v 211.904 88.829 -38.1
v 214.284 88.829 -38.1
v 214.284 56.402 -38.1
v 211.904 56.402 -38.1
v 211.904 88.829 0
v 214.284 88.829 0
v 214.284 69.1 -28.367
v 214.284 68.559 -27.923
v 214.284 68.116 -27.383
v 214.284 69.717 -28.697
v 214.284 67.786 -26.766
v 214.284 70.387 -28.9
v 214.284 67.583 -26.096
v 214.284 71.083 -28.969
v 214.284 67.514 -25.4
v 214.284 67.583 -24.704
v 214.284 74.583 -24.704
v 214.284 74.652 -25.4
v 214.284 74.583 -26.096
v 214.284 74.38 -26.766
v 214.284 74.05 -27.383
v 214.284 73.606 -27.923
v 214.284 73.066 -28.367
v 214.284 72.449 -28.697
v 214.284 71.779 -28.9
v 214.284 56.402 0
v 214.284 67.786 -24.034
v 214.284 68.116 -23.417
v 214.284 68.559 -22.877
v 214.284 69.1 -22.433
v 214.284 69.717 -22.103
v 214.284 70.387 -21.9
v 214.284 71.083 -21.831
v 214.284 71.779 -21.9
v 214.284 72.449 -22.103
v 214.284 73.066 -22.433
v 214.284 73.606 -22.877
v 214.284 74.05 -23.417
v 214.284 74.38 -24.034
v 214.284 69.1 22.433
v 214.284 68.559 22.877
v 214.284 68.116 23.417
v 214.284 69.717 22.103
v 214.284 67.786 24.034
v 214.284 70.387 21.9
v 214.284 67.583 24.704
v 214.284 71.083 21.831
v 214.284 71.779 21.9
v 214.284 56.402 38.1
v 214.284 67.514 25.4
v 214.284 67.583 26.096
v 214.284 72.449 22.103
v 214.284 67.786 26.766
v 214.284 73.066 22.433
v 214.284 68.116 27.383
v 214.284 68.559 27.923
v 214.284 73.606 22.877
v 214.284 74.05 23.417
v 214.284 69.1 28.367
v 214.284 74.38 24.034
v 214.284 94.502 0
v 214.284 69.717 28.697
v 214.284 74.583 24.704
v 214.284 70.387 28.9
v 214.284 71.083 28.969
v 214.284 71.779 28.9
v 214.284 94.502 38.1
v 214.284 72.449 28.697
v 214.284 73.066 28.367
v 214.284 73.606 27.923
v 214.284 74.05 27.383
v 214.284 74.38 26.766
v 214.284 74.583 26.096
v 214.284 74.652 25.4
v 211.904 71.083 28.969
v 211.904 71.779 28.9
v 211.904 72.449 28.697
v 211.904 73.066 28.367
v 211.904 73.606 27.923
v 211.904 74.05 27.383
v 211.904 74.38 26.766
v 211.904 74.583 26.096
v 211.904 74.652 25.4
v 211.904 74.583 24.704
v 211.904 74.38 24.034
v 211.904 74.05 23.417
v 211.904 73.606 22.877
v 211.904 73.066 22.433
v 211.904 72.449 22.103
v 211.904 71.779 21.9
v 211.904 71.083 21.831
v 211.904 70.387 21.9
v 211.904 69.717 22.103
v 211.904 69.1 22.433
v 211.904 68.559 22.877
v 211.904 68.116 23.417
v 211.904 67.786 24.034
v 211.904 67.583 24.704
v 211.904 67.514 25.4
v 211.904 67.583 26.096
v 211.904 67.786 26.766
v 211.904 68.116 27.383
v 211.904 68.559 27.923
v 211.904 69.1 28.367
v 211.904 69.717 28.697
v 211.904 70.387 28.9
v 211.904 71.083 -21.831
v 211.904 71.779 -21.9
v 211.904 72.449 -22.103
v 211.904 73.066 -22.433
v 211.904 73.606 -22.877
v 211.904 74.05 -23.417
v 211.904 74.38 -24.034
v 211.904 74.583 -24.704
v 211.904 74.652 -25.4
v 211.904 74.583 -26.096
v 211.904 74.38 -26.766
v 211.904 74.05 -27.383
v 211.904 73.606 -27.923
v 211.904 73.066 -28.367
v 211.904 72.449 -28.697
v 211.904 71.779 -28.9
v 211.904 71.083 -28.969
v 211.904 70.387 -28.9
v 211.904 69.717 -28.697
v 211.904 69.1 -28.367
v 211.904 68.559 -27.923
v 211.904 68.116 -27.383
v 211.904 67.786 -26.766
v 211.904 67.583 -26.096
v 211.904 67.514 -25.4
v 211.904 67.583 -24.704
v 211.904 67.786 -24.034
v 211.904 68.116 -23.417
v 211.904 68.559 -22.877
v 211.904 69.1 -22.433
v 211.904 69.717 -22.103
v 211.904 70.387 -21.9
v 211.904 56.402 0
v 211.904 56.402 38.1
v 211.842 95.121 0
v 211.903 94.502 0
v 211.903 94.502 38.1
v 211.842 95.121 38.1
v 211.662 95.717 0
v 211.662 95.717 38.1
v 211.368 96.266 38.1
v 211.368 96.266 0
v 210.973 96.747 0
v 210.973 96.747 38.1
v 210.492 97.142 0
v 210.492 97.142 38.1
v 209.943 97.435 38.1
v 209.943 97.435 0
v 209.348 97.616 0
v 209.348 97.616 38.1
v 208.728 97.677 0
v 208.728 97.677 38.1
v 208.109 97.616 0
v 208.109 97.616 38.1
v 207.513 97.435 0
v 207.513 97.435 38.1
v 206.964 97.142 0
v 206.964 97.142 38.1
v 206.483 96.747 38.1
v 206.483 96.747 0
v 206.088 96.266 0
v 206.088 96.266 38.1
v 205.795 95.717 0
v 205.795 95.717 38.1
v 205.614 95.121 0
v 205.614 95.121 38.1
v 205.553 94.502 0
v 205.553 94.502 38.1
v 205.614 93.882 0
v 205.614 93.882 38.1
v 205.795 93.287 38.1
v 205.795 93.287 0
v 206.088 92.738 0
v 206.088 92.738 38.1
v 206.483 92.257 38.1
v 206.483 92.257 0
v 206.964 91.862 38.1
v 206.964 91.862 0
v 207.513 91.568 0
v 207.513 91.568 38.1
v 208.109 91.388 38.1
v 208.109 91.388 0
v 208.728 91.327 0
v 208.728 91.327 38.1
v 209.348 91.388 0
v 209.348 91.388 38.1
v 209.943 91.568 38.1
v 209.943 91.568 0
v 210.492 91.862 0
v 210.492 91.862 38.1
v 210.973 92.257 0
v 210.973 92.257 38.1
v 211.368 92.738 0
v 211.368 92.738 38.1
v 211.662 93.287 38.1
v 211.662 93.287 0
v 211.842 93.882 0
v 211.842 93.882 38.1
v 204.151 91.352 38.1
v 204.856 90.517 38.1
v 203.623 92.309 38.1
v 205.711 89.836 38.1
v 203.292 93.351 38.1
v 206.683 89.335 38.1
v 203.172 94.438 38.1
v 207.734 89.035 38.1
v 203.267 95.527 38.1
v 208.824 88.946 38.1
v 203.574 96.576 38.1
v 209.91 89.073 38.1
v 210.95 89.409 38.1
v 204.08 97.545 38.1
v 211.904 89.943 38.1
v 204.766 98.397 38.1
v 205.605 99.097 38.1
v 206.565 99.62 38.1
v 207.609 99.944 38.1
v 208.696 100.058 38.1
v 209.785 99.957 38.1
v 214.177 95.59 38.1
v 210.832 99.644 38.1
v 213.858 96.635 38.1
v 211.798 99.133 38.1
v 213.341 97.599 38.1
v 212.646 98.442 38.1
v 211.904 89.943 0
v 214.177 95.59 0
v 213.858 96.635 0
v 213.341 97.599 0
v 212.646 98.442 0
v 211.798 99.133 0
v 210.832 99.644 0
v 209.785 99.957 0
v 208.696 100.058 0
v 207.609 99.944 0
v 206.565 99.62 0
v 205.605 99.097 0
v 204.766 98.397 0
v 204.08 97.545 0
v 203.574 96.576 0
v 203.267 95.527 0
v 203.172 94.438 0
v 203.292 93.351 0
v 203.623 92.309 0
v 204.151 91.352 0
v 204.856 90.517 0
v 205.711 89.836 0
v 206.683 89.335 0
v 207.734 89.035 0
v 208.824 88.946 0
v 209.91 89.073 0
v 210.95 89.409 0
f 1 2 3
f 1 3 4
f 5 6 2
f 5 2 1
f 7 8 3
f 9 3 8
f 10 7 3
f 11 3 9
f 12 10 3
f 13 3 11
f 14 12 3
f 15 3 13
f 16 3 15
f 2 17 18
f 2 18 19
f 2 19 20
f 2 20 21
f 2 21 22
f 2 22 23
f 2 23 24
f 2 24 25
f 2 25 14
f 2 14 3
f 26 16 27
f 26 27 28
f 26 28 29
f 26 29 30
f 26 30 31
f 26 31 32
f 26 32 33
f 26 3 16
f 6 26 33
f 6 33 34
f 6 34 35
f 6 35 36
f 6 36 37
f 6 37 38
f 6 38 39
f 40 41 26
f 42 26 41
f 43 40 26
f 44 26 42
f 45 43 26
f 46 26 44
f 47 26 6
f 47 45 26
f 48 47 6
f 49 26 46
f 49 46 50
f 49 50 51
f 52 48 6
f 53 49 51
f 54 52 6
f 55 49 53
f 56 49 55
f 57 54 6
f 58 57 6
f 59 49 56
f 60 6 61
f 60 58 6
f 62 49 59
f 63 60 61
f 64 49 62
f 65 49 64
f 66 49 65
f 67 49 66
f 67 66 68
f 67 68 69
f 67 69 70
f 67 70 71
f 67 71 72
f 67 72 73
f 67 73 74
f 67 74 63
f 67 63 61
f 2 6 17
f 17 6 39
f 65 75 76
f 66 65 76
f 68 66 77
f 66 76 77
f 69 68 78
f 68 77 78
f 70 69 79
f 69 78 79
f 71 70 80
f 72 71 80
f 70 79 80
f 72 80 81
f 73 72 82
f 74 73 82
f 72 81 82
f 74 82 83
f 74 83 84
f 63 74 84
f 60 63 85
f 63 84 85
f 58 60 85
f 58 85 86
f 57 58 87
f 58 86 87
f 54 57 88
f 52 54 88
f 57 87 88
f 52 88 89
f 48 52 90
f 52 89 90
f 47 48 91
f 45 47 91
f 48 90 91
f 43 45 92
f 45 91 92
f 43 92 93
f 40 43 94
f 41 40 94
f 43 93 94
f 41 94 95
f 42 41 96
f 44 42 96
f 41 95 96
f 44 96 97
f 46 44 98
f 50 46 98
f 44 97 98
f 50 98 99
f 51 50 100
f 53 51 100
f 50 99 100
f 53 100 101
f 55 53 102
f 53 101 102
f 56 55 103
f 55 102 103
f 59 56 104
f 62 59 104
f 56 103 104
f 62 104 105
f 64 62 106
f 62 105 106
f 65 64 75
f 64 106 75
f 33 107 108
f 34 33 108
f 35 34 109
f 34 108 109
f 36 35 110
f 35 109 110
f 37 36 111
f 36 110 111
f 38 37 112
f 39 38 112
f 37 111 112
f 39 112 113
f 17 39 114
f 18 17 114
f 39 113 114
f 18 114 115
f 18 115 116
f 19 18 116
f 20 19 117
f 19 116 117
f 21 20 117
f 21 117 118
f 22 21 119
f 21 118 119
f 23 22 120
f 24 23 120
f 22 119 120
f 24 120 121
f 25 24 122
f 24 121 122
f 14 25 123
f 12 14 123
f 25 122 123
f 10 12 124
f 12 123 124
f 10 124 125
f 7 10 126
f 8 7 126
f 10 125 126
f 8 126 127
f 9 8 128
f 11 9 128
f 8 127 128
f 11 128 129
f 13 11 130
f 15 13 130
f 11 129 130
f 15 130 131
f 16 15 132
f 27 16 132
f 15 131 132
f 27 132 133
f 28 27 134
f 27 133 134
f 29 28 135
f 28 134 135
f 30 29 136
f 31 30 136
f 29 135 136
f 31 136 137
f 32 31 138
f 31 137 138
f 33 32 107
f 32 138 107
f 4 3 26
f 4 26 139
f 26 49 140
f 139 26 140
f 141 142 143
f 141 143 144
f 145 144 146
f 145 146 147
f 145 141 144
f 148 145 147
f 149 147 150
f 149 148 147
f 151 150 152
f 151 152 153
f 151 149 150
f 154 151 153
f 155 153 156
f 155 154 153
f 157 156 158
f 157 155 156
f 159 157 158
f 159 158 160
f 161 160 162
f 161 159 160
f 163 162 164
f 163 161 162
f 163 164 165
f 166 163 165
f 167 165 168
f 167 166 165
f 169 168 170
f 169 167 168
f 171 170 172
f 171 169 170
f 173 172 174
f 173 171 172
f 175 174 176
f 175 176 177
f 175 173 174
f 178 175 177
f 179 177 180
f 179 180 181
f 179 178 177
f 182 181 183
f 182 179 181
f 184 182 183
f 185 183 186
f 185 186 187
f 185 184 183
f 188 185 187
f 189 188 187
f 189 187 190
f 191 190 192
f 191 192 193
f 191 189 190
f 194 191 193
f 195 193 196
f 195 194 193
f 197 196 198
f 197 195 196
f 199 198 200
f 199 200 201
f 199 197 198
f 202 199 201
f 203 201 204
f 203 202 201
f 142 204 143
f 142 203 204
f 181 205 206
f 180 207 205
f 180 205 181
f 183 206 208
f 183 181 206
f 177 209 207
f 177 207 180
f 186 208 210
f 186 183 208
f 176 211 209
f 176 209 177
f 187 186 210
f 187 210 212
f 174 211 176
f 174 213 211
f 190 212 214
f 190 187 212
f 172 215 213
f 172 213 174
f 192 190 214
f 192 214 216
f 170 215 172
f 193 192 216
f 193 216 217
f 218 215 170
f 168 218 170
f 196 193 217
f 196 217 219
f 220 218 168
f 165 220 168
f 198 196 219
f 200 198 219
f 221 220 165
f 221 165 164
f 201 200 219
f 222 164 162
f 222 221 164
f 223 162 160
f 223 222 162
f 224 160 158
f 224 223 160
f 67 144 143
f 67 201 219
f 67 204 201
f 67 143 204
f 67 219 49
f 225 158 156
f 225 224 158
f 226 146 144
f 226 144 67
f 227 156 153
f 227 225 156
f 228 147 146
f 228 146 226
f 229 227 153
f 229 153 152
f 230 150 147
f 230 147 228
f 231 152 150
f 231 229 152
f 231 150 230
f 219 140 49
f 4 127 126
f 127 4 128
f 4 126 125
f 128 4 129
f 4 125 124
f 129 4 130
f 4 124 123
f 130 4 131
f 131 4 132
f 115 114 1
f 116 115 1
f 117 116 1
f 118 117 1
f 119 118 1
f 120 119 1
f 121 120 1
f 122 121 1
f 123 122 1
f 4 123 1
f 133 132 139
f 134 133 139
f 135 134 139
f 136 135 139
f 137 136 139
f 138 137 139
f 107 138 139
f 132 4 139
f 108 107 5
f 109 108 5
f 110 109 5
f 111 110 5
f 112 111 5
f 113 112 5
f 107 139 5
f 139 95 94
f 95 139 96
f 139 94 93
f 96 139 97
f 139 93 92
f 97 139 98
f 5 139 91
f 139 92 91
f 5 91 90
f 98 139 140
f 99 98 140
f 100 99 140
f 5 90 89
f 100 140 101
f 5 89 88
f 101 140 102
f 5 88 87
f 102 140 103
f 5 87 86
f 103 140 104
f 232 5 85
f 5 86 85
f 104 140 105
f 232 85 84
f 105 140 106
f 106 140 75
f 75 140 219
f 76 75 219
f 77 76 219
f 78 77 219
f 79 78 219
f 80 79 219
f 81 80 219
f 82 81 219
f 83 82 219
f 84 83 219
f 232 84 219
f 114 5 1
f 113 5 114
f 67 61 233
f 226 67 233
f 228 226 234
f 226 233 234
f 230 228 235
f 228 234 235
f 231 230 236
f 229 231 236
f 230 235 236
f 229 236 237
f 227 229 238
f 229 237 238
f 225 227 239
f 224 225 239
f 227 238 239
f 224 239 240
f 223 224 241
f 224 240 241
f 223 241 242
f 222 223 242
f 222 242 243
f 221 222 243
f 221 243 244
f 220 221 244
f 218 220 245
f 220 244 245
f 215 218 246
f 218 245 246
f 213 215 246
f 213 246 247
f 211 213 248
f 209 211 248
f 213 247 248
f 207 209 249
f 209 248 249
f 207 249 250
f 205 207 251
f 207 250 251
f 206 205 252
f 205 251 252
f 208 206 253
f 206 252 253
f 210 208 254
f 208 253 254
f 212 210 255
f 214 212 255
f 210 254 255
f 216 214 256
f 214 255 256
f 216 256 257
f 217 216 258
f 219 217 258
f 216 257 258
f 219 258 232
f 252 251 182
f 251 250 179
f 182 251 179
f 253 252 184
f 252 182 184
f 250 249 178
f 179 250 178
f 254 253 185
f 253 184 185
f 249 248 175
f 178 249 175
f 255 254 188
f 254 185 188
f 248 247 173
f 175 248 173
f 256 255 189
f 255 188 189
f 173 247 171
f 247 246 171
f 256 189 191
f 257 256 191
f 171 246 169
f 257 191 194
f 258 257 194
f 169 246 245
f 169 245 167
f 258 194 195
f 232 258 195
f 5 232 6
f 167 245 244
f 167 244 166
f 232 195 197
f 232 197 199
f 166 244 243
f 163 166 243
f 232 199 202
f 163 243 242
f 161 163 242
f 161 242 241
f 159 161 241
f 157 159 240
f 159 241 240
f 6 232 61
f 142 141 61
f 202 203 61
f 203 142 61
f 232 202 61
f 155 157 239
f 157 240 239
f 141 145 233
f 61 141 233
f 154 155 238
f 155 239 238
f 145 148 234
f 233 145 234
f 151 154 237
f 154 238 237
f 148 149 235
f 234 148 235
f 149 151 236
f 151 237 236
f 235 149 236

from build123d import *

# Parameters (mm, degrees)
SKETCH1_R          = 3.175
EXTRUDE1_DEPTH     = 38.1
SKETCH2_W          = 2.380423229
SKETCH2_H          = 32.427702335
EXTRUDE2_DEPTH     = 38.1
SKETCH3_R          = 3.5687
CUT_EXTRUDE1_DEPTH = 2.380423


with BuildPart() as part:
    # Sketch1 → Extrude1 (new body)
    with BuildSketch(Plane.XY):
        with BuildLine():
            Line((214.284444429, 56.4017138), (214.284444429, 94.5017138))
            ThreePointArc((214.284444429, 94.5017138), (203.802872025, 97.073311219), (211.9040212, 89.942543))
            Line((211.9040212, 89.942543), (211.9040212, 56.4017138))
            Line((211.9040212, 56.4017138), (214.284444429, 56.4017138))
        make_face()
        with Locations((208.728194429, 94.5017138)):
            Circle(SKETCH1_R, mode=Mode.SUBTRACT)
    extrude(amount=EXTRUDE1_DEPTH)

    # Sketch2 → Extrude2 (add)
    with BuildSketch(Plane(origin=(0, 0, 0), x_dir=(-1, 0, 0), z_dir=(0, 0, -1))):
        with Locations((-213.094232815, 72.615564968)):
            Rectangle(SKETCH2_W, SKETCH2_H)
    extrude(amount=EXTRUDE2_DEPTH)

    # Sketch3 → Cut-Extrude1 (cut)
    with BuildSketch(Plane.ZY.offset(-211.9040212)):
        with Locations((-25.4, 71.0829138)):
            Circle(SKETCH3_R)
        with Locations((25.4, 71.0829138)):
            Circle(SKETCH3_R)
    extrude(amount=-CUT_EXTRUDE1_DEPTH, mode=Mode.SUBTRACT)


solid = part.part
